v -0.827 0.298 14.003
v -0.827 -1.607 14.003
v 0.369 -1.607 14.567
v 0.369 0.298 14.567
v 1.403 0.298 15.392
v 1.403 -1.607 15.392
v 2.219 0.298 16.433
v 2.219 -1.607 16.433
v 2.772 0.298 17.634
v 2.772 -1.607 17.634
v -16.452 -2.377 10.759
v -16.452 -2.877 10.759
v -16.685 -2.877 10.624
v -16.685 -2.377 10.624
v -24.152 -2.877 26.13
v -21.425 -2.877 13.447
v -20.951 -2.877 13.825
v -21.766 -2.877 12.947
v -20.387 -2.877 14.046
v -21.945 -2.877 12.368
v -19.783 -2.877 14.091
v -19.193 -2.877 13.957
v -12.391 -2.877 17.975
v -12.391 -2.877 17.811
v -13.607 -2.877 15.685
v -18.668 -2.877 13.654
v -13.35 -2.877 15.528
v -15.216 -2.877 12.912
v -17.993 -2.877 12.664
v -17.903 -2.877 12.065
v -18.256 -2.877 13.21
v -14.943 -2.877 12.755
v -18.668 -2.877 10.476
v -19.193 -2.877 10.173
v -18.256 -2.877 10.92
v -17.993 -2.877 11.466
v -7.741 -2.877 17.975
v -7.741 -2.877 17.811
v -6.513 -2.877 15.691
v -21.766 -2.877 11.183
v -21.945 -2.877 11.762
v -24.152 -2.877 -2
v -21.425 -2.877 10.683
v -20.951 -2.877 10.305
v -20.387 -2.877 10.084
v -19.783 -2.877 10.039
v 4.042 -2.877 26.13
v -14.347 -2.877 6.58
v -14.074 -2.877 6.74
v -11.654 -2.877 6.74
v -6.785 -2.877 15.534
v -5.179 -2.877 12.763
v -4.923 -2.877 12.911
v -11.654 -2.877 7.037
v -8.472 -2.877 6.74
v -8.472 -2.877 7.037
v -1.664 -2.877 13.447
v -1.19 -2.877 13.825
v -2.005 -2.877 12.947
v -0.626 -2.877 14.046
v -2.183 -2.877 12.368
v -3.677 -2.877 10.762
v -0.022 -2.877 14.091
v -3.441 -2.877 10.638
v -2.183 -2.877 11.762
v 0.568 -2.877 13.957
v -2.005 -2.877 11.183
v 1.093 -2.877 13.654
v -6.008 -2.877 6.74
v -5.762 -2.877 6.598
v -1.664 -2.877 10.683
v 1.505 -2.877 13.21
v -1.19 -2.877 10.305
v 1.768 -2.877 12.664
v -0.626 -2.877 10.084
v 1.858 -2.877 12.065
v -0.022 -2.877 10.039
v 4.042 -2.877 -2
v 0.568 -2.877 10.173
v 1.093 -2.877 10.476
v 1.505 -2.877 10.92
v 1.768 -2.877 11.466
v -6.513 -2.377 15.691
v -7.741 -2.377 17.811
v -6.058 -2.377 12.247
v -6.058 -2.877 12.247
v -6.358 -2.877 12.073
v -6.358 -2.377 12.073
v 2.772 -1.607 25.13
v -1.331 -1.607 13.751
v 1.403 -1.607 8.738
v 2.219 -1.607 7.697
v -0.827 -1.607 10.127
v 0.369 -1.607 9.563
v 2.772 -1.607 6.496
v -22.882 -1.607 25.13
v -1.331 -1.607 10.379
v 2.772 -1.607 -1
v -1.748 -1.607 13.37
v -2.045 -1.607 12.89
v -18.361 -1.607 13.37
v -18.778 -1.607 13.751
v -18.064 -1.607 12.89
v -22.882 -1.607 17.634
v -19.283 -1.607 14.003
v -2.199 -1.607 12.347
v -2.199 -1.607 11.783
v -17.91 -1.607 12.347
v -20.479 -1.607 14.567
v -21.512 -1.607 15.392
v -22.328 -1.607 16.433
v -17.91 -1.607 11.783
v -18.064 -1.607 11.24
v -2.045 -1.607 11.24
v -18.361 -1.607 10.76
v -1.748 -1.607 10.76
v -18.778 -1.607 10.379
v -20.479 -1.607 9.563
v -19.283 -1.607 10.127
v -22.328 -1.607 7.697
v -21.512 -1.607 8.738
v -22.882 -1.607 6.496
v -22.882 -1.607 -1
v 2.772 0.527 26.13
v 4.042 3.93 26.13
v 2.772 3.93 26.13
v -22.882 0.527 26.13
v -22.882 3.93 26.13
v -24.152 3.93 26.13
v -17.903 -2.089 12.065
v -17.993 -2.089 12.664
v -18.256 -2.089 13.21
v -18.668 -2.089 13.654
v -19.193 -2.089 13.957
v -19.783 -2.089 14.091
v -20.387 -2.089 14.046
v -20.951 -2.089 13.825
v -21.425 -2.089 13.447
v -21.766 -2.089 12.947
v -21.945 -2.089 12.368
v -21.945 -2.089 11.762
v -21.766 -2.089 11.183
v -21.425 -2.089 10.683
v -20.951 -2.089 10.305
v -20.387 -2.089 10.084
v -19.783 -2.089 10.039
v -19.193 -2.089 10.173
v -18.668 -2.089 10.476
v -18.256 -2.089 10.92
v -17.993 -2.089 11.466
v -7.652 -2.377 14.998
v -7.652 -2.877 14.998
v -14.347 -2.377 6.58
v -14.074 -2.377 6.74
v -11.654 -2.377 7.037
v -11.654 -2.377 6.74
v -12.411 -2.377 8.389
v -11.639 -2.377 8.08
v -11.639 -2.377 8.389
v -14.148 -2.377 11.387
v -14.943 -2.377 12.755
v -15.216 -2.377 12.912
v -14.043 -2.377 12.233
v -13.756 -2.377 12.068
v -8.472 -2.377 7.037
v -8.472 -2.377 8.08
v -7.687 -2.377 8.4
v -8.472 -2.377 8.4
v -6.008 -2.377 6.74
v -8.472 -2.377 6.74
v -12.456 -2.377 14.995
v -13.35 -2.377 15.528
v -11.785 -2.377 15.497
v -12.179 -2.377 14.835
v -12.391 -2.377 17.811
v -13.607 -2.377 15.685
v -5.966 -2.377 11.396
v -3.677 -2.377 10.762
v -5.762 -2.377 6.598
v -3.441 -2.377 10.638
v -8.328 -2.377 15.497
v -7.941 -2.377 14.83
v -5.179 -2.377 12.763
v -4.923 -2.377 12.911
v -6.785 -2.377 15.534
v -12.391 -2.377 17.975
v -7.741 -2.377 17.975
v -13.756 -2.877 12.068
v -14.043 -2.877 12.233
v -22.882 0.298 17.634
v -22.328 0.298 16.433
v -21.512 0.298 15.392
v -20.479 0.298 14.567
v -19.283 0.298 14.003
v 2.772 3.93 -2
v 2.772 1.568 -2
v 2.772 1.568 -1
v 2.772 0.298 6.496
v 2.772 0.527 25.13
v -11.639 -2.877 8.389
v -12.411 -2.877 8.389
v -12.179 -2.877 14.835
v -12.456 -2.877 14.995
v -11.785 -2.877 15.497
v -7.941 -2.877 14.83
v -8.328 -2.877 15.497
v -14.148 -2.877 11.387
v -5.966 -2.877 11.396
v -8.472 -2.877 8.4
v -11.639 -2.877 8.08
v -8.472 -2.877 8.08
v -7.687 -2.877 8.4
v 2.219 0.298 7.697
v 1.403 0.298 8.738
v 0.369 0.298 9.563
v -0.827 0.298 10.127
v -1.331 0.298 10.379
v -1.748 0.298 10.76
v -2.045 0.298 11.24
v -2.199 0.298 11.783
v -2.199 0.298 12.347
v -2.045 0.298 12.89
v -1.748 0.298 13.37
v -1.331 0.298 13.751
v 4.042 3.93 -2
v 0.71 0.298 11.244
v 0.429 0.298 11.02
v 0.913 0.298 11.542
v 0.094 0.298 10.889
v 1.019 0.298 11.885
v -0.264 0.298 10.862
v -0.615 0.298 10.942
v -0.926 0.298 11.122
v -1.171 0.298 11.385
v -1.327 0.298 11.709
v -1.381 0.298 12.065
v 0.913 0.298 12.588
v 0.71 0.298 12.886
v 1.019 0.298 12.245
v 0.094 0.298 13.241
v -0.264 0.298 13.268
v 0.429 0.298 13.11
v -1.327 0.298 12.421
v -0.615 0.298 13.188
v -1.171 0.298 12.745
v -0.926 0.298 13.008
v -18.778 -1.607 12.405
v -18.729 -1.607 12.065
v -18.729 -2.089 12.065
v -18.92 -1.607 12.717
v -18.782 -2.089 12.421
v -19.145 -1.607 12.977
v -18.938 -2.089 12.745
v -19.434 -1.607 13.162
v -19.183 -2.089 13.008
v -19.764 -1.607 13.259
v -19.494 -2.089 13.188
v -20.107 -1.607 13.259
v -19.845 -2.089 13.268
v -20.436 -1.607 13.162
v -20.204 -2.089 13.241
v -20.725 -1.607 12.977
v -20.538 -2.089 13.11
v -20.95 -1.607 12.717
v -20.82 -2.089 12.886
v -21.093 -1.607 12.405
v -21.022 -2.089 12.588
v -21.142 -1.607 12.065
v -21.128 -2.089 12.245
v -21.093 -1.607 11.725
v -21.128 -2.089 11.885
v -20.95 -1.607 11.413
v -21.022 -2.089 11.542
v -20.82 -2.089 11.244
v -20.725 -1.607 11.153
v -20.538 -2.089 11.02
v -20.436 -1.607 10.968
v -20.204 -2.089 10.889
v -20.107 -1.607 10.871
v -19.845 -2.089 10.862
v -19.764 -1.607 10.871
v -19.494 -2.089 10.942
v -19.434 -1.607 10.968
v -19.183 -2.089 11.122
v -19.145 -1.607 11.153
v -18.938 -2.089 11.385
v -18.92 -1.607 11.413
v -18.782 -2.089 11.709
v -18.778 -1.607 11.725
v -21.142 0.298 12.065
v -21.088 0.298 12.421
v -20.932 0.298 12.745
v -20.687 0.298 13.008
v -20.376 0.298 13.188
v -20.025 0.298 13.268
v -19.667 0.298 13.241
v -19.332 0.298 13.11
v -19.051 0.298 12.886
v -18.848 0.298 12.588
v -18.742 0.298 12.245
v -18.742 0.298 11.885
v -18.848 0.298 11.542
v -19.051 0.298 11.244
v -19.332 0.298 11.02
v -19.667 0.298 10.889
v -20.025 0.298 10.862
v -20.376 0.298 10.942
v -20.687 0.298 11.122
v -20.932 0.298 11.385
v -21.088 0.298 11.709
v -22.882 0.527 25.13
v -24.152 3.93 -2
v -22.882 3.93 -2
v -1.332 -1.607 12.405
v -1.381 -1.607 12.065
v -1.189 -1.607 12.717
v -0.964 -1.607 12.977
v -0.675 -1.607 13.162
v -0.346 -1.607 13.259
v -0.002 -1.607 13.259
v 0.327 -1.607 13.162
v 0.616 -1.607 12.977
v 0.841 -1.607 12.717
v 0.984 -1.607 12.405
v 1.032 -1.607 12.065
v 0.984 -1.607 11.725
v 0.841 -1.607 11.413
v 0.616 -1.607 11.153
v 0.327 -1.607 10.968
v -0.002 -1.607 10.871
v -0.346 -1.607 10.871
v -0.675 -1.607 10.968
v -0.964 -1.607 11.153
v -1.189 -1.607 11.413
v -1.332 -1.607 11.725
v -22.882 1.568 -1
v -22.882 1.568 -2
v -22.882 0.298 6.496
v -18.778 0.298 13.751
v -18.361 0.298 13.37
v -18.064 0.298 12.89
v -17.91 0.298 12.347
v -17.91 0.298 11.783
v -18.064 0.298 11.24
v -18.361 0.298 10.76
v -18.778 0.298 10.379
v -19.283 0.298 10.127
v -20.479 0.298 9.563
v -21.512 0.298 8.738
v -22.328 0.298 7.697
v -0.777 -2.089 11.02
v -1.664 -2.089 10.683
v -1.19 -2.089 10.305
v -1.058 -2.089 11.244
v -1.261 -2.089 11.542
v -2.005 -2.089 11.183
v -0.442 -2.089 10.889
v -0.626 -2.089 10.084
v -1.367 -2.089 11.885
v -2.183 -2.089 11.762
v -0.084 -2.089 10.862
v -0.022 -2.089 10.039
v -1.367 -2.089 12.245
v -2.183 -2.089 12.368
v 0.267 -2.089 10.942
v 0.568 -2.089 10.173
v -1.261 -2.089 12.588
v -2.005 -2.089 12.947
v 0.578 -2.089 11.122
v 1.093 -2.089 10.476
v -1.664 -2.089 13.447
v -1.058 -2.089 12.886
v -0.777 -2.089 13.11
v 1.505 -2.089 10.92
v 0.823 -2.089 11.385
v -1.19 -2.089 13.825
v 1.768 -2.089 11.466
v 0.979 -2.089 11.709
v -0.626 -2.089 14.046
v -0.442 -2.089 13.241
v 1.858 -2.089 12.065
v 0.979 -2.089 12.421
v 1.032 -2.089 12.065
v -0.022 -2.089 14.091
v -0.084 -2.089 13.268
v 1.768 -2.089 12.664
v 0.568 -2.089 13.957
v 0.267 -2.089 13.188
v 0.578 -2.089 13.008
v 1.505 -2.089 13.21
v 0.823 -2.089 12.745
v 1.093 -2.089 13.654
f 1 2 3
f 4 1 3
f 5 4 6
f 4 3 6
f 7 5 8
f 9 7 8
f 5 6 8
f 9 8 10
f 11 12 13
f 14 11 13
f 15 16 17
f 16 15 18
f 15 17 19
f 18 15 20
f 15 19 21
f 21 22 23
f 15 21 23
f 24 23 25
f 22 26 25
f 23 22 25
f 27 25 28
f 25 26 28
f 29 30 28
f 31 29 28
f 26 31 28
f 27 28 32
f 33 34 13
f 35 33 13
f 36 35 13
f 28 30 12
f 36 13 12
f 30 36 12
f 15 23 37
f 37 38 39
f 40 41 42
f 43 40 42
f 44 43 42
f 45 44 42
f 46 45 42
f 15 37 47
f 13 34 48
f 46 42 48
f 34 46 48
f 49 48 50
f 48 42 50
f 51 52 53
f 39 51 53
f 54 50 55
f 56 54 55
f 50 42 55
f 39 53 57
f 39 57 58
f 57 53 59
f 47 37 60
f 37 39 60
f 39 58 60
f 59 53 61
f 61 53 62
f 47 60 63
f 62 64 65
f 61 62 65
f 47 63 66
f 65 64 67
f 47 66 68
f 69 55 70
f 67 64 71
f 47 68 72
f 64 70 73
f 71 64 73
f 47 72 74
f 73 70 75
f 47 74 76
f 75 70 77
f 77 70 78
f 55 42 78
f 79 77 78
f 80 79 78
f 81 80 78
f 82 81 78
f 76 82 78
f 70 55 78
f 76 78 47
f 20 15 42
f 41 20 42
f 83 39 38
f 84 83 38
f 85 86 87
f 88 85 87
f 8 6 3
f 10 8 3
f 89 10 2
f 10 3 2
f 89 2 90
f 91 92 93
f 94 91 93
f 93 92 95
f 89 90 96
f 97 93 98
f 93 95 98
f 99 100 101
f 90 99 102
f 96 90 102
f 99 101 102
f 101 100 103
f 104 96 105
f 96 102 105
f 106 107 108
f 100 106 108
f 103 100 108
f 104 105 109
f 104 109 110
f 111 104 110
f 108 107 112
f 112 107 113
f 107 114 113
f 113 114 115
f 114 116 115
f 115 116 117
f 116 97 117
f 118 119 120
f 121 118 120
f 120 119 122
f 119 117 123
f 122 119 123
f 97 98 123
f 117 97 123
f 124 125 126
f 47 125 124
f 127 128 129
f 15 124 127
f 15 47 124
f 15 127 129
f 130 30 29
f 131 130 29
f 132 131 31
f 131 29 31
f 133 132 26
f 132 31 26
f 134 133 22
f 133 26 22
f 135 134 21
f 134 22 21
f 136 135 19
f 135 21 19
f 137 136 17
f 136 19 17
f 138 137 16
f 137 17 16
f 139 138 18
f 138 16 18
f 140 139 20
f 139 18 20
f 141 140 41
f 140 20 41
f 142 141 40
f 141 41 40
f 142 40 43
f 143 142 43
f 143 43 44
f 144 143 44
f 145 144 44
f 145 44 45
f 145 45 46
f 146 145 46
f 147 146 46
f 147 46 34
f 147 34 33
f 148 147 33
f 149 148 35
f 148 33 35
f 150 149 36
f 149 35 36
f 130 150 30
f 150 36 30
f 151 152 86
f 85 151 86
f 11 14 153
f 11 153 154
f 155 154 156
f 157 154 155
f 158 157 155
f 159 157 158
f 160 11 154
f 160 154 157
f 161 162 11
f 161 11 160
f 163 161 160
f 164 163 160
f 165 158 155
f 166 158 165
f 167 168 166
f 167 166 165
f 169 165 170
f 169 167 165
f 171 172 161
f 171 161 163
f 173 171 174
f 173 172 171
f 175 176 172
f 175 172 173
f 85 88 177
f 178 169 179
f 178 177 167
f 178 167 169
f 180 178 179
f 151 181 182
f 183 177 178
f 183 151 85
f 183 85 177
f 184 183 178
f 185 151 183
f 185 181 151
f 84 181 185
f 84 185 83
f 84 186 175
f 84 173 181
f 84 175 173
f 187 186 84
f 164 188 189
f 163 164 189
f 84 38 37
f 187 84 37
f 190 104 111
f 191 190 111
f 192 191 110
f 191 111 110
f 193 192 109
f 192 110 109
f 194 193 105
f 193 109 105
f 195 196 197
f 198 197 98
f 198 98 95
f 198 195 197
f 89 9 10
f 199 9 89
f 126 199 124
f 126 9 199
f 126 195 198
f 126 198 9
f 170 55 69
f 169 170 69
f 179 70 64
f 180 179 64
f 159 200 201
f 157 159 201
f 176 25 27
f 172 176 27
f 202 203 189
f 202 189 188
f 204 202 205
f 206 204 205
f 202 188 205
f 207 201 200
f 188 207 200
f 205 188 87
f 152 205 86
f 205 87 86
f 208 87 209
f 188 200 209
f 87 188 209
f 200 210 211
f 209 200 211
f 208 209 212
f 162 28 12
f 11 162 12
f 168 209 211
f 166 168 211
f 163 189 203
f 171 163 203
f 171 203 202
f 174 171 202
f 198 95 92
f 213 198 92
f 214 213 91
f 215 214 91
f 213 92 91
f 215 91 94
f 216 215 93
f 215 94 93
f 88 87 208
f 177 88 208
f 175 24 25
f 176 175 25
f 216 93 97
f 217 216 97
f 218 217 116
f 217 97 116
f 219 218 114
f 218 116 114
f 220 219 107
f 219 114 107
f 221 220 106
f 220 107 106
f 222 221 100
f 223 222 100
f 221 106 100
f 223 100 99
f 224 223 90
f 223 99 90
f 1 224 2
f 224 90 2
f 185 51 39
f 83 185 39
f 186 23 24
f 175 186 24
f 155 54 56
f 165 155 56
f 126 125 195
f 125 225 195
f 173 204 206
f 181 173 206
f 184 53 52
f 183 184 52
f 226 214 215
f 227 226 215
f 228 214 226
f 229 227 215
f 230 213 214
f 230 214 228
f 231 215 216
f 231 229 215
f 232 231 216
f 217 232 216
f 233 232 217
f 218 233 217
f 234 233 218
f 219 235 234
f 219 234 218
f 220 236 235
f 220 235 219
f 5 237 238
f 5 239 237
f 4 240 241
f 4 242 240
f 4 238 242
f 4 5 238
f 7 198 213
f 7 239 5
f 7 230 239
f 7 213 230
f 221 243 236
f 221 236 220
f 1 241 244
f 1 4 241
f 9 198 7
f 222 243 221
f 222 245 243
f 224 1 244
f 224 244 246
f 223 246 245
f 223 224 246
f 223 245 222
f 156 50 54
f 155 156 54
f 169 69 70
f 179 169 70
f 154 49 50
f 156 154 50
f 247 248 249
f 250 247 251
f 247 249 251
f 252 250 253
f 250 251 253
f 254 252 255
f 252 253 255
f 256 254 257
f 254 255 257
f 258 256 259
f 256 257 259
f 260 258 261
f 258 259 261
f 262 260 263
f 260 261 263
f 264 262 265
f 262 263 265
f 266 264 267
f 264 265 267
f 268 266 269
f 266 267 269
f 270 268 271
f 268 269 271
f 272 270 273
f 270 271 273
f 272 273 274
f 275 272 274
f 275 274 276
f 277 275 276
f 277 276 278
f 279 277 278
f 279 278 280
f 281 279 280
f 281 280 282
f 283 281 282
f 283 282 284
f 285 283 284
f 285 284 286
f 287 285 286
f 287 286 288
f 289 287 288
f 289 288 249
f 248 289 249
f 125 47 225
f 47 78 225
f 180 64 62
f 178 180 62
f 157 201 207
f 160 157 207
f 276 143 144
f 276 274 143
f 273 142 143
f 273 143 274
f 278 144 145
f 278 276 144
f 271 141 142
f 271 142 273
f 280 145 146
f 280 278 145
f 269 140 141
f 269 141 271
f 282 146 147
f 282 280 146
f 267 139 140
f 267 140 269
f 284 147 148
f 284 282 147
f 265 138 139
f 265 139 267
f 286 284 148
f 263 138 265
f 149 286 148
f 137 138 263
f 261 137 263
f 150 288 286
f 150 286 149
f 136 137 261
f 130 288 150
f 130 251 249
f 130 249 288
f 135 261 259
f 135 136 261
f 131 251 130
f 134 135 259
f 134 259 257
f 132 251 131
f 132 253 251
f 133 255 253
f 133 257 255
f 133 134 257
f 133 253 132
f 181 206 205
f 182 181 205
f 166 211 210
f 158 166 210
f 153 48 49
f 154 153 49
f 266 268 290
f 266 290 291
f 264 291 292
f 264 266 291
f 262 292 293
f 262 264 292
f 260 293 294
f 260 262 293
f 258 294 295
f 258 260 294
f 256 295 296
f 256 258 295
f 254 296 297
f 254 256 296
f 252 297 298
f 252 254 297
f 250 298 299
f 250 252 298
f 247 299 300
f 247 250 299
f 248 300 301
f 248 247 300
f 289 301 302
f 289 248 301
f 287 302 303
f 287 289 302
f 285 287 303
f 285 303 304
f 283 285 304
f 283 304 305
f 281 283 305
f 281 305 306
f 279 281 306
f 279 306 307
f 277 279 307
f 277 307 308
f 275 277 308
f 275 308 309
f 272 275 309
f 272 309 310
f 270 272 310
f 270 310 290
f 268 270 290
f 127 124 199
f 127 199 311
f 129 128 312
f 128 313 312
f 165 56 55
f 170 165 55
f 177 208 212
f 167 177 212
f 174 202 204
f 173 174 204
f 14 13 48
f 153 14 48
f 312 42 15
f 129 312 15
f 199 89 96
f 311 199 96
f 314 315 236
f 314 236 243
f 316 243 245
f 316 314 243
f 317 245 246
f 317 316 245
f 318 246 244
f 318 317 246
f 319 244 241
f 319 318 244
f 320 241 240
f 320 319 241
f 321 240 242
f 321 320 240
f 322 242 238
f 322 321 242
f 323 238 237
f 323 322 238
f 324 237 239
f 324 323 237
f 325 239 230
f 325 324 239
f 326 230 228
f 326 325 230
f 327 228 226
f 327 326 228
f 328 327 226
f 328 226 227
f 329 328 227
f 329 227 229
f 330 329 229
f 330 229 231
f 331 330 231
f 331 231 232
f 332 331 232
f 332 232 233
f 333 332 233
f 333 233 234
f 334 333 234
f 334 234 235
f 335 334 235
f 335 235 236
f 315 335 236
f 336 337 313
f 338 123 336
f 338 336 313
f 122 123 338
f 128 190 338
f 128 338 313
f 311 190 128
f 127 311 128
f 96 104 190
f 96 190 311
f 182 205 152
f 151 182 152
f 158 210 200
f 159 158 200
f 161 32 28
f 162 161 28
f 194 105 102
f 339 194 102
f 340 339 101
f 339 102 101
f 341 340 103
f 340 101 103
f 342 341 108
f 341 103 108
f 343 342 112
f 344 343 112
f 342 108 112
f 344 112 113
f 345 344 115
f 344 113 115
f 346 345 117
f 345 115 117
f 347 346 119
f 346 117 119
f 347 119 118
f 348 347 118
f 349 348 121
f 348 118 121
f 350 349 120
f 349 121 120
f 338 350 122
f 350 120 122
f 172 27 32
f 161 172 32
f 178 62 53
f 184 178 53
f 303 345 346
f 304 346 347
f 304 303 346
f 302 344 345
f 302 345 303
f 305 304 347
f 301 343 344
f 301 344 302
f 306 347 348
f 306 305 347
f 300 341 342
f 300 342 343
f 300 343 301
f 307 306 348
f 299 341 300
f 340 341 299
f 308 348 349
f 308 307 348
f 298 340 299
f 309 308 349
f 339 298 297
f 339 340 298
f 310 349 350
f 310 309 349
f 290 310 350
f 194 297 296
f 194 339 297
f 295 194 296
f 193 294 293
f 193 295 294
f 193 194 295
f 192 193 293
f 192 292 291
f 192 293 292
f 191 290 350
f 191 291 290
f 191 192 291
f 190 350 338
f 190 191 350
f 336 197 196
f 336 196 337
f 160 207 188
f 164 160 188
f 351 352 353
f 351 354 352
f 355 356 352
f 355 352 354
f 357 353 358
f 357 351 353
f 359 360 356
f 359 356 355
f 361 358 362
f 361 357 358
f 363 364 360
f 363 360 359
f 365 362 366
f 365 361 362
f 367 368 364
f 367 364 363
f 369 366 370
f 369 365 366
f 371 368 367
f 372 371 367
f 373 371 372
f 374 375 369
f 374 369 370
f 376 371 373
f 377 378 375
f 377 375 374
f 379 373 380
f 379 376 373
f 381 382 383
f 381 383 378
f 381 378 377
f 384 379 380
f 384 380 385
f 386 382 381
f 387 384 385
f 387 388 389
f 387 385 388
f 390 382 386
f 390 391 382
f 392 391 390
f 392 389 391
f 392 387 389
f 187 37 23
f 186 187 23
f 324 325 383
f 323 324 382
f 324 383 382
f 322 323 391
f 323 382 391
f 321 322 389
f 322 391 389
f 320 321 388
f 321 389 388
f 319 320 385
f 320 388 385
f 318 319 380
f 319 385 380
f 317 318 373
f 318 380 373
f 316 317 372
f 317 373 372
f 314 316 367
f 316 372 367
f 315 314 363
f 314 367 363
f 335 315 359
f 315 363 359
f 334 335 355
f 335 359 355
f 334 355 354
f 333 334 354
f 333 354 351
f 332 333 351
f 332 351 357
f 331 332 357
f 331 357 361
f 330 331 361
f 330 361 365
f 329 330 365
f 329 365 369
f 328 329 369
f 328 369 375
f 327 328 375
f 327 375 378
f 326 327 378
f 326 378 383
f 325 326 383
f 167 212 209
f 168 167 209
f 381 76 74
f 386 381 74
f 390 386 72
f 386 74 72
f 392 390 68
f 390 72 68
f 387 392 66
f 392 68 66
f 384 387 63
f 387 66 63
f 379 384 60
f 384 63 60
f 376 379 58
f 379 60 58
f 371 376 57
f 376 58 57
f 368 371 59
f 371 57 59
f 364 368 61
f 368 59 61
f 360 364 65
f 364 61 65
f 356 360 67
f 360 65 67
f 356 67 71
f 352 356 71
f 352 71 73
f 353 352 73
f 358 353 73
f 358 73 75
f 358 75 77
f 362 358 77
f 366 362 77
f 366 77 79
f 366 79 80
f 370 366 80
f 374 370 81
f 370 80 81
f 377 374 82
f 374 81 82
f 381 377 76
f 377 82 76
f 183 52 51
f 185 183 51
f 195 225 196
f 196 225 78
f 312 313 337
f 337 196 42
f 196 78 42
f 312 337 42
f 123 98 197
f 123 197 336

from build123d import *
from build123d import SkipClean  # not in build123d's __all__

# Parameters (mm, degrees)
F1_DEPTH  = 24.13
F2_R      = 2.032
F2_R_2    = 1.2065
F3_DEPTH  = 0.7874
F4_DEPTH  = 25.4
F6_DEPTH  = 0.5
F7_DEPTH  = 2
F8_DEPTH  = 2
F9_W      = 25.654
F9_H      = 1
F10_DEPTH = 1.27
F11_R     = 1.2065
F12_DEPTH = 1.905
F13_DEPTH = 1.905
F14_DEPTH = 1.0414


# Not quite as in the source:
# - after a boolean that leaves OpenCascade's solid faulty, fix() repairs it
# - a feature names something its author has since deleted; it is built from what else it names


with BuildPart() as f1:
    # F0 (on Top) → F1 (new body)
    with BuildSketch(Plane.XY):
        Polygon((-22.881621525, -1.6067087497), (-22.881621525, 2.0254912503), (-24.151621525, 2.0254912503), (-24.151621525, -2.8767087497), (4.042378475, -2.8767087497), (4.042378475, 2.0254912503), (2.772378475, 2.0254912503), (2.772378475, -1.6067087497), align=None)
    extrude(amount=F1_DEPTH)

    # F2 (on face) → F3 (cut)
    with BuildSketch(Plane.XZ.offset(2.8767087497)):
        with Locations((-19.935221525, 12.065)):
            Circle(F2_R)
        with Locations((-19.935221525, 12.065)):
            Circle(F2_R_2, mode=Mode.SUBTRACT)
        with Locations((-0.174021525, 12.065)):
            Circle(F2_R)
        with Locations((-0.174021525, 12.065)):
            Circle(F2_R_2, mode=Mode.SUBTRACT)
    extrude(amount=-F3_DEPTH, mode=Mode.SUBTRACT)

    # F4 (cut): faces of the model
    f4_faces = [f1.faces().sort_by_distance(p)[0] for p in [
        (-19.935221525, -2.8767087497, 12.065),
        (-0.174021525, -2.8767087497, 12.065),
    ]]
    extrude(f4_faces, amount=-F4_DEPTH, mode=Mode.SUBTRACT)

    # F5 (on face) → F6 (cut)
    with BuildSketch(Plane.XZ.offset(2.8767087497)):
        Polygon((-12.3912415756, 17.8113617003), (-13.6065593278, 15.684556216), (-13.3501001609, 15.5277705701), (-14.9427792273, 12.7550959473), (-15.21558023, 12.9117982314), (-16.4524054843, 10.7586249602), (-16.6849697297, 10.6241926551), (-14.3470017528, 6.5795714036), (-14.0742704561, 6.7396221901), (-11.6537952153, 6.7396221901), (-11.6537952153, 7.0368205197), (-8.471750264, 7.0368205197), (-8.471750264, 6.7396221901), (-6.0077723583, 6.7396221901), (-5.7620638571, 6.5984823741), (-3.4414858846, 10.6383468956), (-3.6771140247, 10.7619399543), (-4.9225916905, 12.9113931759), (-5.1792576933, 12.7626708074), (-6.7848130465, 15.533548376), (-6.5128039159, 15.6911611557), (-7.7413314311, 17.8113617003), (-7.7413314311, 17.9749652743), (-12.3912415756, 17.9749652743), align=None)
        Polygon((-12.1788967651, 14.8354667667), (-11.7852579159, 15.4973436147), (-8.3281154101, 15.4973436147), (-7.9414616069, 14.830054039), (-7.6521674377, 14.9976824493), (-6.0583813106, 12.2471162856), (-6.3580625964, 12.0734691718), (-5.9656283895, 11.396203739), (-7.6865507823, 8.4002719491), (-8.471750264, 8.4002719491), (-8.471750264, 8.0795111135), (-11.6385354949, 8.0795111135), (-11.6385354949, 8.3887251094), (-12.4105562744, 8.3887251094), (-14.1476861274, 11.3866747806), (-13.7563398992, 12.0679644255), (-14.0430930461, 12.2326810967), (-12.4564279131, 14.9948861397), align=None, mode=Mode.SUBTRACT)
    extrude(amount=-F6_DEPTH, mode=Mode.SUBTRACT)

    # F7 (add): a face of the model
    f7_faces = [f1.faces().sort_by_distance(p)[0] for p in [
        (-10.054621525, -1.7395492941, 0),
    ]]
    extrude(f7_faces, amount=F7_DEPTH)

    # F8 (add): a face of the model
    f8_faces = [f1.faces().sort_by_distance(p)[0] for p in [
        (-10.054621525, -1.7395492941, 24.13),
    ]]
    extrude(f8_faces, amount=F8_DEPTH)

    # F9 (on face) → F10 (join)
    with BuildSketch(Plane(origin=(0, -1.6067087497, 0), x_dir=(-1, 0, 0), z_dir=(0, 1, 0))):
        with Locations((10.054621525, 25.63)):
            Rectangle(F9_W, F9_H)
        with Locations((10.054621525, -1.5)):
            Rectangle(F9_W, F9_H)
    extrude(amount=F10_DEPTH)

    # F11 (on face) → F12 (join)
    with BuildSketch(Plane(origin=(0, -1.6067087497, 0), x_dir=(-1, 0, 0), z_dir=(0, 1, 0))):
        with BuildLine():
            ThreePointArc((-2.772378475, 6.4958446701), (-1.4028429606, 8.7376625106), (0.8266095876, 10.1272365784))
            ThreePointArc((0.8266095876, 10.1272365784), (2.218721566, 12.065), (0.8266095876, 14.0027634216))
            ThreePointArc((0.8266095876, 14.0027634216), (-1.4028429606, 15.3923374894), (-2.772378475, 17.6341553299))
            Line((-2.772378475, 17.6341553299), (-2.772378475, 6.4958446701))
        make_face()
        with Locations((0.174021525, 12.065)):
            Circle(F11_R, mode=Mode.SUBTRACT)
        with BuildLine():
            ThreePointArc((19.2826334624, 10.1272365784), (21.5120860106, 8.7376625106), (22.881621525, 6.4958446701))
            Line((22.881621525, 6.4958446701), (22.881621525, 17.6341553299))
            ThreePointArc((22.881621525, 17.6341553299), (21.5120860106, 15.3923374894), (19.2826334624, 14.0027634216))
            ThreePointArc((19.2826334624, 14.0027634216), (17.890521484, 12.065), (19.2826334624, 10.1272365784))
        make_face()
        with Locations((19.935221525, 12.065)):
            Circle(F11_R, mode=Mode.SUBTRACT)
    with SkipClean():  # cleaning this boolean's faces spoils the solid; the shape is the same uncleaned
        extrude(amount=F12_DEPTH)

    # F13 (add): faces of the model
    f13_faces = [f1.faces().sort_by_distance(p)[0] for p in [
        (-23.516621525, 2.0254912503, 12.065),
        (-10.054621525, -0.3367087497, 25.63),
        (-10.054621525, -0.3367087497, -1.5),
        (3.407378475, 2.0254912503, 12.065),
    ]]
    extrude(f13_faces, amount=F13_DEPTH)

    add(f1.part.fix(), mode=Mode.REPLACE)

    # F14 (cut): a face of the model
    f14_faces = [f1.faces().sort_by_distance(p)[0] for p in [
        (-10.054621525, 1.5682912503, 25.63),
    ]]
    extrude(f14_faces, amount=-F14_DEPTH, mode=Mode.SUBTRACT)


solid = f1.part
